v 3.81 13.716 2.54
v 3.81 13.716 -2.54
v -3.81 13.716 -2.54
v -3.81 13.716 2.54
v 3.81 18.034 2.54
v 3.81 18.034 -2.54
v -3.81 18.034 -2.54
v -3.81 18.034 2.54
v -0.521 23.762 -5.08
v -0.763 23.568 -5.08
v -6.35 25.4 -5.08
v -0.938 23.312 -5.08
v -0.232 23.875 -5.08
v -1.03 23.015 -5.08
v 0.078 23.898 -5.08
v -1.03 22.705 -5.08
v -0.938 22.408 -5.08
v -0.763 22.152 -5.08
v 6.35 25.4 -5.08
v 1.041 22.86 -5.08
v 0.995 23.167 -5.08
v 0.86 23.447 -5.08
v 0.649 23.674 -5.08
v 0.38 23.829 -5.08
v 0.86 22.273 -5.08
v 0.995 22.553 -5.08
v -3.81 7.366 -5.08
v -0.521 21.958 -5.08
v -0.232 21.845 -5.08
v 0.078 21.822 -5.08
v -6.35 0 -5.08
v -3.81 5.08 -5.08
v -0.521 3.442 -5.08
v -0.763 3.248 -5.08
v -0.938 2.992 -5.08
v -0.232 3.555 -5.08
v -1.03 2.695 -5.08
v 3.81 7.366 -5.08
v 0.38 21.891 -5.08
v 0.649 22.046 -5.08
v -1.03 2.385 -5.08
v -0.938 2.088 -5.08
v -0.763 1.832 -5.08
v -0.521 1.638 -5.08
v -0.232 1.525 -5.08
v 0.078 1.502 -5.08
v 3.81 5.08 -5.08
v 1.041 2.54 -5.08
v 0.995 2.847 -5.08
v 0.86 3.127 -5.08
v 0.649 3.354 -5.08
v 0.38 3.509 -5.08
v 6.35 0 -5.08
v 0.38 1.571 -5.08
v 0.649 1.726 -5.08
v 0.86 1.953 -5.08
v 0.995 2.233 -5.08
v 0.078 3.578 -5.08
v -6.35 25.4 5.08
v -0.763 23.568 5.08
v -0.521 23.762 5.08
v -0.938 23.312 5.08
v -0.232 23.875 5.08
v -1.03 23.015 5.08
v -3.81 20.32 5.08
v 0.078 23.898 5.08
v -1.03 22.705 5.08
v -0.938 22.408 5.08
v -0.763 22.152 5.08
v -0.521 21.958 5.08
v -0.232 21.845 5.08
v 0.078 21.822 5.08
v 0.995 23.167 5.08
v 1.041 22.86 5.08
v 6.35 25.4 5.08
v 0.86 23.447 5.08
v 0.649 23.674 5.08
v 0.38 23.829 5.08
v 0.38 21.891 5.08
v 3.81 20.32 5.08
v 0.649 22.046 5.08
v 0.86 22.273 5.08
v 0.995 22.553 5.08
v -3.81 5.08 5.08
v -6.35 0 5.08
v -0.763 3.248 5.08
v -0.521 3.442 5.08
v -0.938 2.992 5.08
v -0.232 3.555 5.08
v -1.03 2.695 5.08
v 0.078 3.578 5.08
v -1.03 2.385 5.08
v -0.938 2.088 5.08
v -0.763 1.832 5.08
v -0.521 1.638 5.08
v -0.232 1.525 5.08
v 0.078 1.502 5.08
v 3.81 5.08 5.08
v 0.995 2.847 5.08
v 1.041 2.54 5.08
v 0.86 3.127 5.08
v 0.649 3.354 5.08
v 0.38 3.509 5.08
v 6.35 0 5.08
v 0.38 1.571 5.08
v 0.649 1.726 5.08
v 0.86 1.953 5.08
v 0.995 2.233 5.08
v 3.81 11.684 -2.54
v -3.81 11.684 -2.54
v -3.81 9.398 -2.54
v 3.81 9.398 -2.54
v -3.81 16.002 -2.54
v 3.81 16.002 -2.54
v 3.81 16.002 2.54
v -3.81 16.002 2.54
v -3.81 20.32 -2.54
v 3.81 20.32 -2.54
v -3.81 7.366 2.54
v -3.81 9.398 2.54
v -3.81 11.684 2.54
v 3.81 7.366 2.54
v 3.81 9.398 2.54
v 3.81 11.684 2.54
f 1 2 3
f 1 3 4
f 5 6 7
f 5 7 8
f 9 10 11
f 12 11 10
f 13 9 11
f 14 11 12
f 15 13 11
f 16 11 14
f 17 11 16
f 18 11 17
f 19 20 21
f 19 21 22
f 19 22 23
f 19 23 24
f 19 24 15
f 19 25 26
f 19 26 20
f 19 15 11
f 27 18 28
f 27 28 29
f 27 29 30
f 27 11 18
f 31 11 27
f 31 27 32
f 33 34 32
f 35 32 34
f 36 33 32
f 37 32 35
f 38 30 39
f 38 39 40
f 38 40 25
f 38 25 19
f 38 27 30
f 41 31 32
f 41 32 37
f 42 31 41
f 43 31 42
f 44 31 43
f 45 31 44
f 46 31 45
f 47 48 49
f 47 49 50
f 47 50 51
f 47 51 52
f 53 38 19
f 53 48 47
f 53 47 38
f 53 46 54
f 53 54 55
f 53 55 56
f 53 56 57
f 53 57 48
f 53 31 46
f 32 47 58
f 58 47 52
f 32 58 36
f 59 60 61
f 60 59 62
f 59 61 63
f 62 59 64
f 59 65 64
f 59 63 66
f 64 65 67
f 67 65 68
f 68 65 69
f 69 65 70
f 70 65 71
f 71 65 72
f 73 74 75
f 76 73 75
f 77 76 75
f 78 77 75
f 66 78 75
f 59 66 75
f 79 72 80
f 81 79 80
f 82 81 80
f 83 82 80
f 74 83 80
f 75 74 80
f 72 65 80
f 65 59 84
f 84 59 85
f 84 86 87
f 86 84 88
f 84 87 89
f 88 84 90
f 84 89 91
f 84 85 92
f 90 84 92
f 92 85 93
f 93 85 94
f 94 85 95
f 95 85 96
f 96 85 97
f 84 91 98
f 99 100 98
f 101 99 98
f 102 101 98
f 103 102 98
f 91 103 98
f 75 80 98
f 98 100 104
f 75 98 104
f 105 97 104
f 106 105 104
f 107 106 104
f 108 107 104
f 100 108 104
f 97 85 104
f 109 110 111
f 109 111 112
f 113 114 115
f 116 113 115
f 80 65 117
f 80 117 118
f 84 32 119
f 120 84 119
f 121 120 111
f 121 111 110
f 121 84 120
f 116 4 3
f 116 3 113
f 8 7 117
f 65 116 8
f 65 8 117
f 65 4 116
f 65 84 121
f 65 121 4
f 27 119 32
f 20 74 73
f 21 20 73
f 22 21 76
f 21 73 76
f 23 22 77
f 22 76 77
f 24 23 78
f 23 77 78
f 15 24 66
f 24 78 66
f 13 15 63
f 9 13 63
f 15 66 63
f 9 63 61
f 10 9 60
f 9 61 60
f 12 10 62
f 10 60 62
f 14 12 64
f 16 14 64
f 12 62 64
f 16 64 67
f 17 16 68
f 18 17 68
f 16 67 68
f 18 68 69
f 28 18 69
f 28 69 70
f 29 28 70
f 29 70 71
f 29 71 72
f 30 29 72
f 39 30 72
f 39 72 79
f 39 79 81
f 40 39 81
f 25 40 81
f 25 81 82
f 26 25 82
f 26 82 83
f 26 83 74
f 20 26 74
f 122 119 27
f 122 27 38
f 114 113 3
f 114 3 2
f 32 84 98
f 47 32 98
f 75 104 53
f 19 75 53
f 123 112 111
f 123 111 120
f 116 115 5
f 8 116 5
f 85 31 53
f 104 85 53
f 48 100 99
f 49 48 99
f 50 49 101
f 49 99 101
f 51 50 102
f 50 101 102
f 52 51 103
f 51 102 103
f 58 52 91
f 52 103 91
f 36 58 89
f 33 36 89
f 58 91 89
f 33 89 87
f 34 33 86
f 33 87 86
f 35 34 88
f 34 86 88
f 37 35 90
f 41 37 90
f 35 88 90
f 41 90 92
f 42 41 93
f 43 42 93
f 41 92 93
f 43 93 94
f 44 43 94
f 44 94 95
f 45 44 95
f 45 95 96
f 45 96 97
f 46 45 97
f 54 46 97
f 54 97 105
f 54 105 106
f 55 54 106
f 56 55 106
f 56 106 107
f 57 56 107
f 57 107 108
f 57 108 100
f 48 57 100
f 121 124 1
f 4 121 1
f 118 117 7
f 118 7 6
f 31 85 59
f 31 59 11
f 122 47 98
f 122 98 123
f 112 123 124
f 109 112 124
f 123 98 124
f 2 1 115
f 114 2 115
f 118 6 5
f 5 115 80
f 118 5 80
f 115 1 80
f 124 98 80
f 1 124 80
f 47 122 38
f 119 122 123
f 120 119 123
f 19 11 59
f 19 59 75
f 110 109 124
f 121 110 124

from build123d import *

# Parameters (mm, degrees)
SKETCH1_W           = 12.7
SKETCH1_H           = 10.16
BOSS_EXTRUDE1_DEPTH = 25.4
SKETCH2_W           = 7.62
SKETCH2_H           = 15.24
CUT_EXTRUDE1_DEPTH  = 7.62
SKETCH3_W           = 5.08
SKETCH3_H           = 2.032
BOSS_EXTRUDE2_DEPTH = 7.62
SKETCH4_W           = 7.62
SKETCH4_H           = 2.286
CUT_EXTRUDE2_DEPTH  = 3.54
SKETCH5_R           = 1.0414
CUT_EXTRUDE4_DEPTH  = 11.16


with BuildPart() as part:
    # Sketch1 → Boss-Extrude1 (new body)
    with BuildSketch(Plane(origin=(0, 0, 0), x_dir=(1, 0, 0), z_dir=(0, 1, 0))):
        Rectangle(SKETCH1_W, SKETCH1_H)
    extrude(amount=BOSS_EXTRUDE1_DEPTH)

    # Sketch2 → Cut-Extrude1 (cut)
    with BuildSketch(Plane.XY.offset(5.08)):
        with Locations((0, 12.7)):
            Rectangle(SKETCH2_W, SKETCH2_H)
    extrude(amount=-CUT_EXTRUDE1_DEPTH, mode=Mode.SUBTRACT)

    # Sketch3 → Boss-Extrude2 (add)
    with BuildSketch(Plane.ZY.offset(-3.81)):
        with Locations((0, 12.7)):
            Rectangle(SKETCH3_W, SKETCH3_H)
        with Locations((0, 8.382)):
            Rectangle(SKETCH3_W, SKETCH3_H)
        with Locations((0, 17.018)):
            Rectangle(SKETCH3_W, SKETCH3_H)
    extrude(amount=BOSS_EXTRUDE2_DEPTH)

    # Sketch4 → Cut-Extrude2 (cut, through all)
    with BuildSketch(Plane.XY.offset(-2.54)):
        with Locations((0, 6.223)):
            Rectangle(SKETCH4_W, SKETCH4_H)
    extrude(amount=-CUT_EXTRUDE2_DEPTH, mode=Mode.SUBTRACT)

    # Sketch5 → Cut-Extrude4 (cut, through all)
    with BuildSketch(Plane.XY.offset(5.08)):
        with Locations((0, 2.54)):
            Circle(SKETCH5_R)
        with Locations((0, 22.86)):
            Circle(SKETCH5_R)
    extrude(amount=-CUT_EXTRUDE4_DEPTH, mode=Mode.SUBTRACT)


solid = part.part
